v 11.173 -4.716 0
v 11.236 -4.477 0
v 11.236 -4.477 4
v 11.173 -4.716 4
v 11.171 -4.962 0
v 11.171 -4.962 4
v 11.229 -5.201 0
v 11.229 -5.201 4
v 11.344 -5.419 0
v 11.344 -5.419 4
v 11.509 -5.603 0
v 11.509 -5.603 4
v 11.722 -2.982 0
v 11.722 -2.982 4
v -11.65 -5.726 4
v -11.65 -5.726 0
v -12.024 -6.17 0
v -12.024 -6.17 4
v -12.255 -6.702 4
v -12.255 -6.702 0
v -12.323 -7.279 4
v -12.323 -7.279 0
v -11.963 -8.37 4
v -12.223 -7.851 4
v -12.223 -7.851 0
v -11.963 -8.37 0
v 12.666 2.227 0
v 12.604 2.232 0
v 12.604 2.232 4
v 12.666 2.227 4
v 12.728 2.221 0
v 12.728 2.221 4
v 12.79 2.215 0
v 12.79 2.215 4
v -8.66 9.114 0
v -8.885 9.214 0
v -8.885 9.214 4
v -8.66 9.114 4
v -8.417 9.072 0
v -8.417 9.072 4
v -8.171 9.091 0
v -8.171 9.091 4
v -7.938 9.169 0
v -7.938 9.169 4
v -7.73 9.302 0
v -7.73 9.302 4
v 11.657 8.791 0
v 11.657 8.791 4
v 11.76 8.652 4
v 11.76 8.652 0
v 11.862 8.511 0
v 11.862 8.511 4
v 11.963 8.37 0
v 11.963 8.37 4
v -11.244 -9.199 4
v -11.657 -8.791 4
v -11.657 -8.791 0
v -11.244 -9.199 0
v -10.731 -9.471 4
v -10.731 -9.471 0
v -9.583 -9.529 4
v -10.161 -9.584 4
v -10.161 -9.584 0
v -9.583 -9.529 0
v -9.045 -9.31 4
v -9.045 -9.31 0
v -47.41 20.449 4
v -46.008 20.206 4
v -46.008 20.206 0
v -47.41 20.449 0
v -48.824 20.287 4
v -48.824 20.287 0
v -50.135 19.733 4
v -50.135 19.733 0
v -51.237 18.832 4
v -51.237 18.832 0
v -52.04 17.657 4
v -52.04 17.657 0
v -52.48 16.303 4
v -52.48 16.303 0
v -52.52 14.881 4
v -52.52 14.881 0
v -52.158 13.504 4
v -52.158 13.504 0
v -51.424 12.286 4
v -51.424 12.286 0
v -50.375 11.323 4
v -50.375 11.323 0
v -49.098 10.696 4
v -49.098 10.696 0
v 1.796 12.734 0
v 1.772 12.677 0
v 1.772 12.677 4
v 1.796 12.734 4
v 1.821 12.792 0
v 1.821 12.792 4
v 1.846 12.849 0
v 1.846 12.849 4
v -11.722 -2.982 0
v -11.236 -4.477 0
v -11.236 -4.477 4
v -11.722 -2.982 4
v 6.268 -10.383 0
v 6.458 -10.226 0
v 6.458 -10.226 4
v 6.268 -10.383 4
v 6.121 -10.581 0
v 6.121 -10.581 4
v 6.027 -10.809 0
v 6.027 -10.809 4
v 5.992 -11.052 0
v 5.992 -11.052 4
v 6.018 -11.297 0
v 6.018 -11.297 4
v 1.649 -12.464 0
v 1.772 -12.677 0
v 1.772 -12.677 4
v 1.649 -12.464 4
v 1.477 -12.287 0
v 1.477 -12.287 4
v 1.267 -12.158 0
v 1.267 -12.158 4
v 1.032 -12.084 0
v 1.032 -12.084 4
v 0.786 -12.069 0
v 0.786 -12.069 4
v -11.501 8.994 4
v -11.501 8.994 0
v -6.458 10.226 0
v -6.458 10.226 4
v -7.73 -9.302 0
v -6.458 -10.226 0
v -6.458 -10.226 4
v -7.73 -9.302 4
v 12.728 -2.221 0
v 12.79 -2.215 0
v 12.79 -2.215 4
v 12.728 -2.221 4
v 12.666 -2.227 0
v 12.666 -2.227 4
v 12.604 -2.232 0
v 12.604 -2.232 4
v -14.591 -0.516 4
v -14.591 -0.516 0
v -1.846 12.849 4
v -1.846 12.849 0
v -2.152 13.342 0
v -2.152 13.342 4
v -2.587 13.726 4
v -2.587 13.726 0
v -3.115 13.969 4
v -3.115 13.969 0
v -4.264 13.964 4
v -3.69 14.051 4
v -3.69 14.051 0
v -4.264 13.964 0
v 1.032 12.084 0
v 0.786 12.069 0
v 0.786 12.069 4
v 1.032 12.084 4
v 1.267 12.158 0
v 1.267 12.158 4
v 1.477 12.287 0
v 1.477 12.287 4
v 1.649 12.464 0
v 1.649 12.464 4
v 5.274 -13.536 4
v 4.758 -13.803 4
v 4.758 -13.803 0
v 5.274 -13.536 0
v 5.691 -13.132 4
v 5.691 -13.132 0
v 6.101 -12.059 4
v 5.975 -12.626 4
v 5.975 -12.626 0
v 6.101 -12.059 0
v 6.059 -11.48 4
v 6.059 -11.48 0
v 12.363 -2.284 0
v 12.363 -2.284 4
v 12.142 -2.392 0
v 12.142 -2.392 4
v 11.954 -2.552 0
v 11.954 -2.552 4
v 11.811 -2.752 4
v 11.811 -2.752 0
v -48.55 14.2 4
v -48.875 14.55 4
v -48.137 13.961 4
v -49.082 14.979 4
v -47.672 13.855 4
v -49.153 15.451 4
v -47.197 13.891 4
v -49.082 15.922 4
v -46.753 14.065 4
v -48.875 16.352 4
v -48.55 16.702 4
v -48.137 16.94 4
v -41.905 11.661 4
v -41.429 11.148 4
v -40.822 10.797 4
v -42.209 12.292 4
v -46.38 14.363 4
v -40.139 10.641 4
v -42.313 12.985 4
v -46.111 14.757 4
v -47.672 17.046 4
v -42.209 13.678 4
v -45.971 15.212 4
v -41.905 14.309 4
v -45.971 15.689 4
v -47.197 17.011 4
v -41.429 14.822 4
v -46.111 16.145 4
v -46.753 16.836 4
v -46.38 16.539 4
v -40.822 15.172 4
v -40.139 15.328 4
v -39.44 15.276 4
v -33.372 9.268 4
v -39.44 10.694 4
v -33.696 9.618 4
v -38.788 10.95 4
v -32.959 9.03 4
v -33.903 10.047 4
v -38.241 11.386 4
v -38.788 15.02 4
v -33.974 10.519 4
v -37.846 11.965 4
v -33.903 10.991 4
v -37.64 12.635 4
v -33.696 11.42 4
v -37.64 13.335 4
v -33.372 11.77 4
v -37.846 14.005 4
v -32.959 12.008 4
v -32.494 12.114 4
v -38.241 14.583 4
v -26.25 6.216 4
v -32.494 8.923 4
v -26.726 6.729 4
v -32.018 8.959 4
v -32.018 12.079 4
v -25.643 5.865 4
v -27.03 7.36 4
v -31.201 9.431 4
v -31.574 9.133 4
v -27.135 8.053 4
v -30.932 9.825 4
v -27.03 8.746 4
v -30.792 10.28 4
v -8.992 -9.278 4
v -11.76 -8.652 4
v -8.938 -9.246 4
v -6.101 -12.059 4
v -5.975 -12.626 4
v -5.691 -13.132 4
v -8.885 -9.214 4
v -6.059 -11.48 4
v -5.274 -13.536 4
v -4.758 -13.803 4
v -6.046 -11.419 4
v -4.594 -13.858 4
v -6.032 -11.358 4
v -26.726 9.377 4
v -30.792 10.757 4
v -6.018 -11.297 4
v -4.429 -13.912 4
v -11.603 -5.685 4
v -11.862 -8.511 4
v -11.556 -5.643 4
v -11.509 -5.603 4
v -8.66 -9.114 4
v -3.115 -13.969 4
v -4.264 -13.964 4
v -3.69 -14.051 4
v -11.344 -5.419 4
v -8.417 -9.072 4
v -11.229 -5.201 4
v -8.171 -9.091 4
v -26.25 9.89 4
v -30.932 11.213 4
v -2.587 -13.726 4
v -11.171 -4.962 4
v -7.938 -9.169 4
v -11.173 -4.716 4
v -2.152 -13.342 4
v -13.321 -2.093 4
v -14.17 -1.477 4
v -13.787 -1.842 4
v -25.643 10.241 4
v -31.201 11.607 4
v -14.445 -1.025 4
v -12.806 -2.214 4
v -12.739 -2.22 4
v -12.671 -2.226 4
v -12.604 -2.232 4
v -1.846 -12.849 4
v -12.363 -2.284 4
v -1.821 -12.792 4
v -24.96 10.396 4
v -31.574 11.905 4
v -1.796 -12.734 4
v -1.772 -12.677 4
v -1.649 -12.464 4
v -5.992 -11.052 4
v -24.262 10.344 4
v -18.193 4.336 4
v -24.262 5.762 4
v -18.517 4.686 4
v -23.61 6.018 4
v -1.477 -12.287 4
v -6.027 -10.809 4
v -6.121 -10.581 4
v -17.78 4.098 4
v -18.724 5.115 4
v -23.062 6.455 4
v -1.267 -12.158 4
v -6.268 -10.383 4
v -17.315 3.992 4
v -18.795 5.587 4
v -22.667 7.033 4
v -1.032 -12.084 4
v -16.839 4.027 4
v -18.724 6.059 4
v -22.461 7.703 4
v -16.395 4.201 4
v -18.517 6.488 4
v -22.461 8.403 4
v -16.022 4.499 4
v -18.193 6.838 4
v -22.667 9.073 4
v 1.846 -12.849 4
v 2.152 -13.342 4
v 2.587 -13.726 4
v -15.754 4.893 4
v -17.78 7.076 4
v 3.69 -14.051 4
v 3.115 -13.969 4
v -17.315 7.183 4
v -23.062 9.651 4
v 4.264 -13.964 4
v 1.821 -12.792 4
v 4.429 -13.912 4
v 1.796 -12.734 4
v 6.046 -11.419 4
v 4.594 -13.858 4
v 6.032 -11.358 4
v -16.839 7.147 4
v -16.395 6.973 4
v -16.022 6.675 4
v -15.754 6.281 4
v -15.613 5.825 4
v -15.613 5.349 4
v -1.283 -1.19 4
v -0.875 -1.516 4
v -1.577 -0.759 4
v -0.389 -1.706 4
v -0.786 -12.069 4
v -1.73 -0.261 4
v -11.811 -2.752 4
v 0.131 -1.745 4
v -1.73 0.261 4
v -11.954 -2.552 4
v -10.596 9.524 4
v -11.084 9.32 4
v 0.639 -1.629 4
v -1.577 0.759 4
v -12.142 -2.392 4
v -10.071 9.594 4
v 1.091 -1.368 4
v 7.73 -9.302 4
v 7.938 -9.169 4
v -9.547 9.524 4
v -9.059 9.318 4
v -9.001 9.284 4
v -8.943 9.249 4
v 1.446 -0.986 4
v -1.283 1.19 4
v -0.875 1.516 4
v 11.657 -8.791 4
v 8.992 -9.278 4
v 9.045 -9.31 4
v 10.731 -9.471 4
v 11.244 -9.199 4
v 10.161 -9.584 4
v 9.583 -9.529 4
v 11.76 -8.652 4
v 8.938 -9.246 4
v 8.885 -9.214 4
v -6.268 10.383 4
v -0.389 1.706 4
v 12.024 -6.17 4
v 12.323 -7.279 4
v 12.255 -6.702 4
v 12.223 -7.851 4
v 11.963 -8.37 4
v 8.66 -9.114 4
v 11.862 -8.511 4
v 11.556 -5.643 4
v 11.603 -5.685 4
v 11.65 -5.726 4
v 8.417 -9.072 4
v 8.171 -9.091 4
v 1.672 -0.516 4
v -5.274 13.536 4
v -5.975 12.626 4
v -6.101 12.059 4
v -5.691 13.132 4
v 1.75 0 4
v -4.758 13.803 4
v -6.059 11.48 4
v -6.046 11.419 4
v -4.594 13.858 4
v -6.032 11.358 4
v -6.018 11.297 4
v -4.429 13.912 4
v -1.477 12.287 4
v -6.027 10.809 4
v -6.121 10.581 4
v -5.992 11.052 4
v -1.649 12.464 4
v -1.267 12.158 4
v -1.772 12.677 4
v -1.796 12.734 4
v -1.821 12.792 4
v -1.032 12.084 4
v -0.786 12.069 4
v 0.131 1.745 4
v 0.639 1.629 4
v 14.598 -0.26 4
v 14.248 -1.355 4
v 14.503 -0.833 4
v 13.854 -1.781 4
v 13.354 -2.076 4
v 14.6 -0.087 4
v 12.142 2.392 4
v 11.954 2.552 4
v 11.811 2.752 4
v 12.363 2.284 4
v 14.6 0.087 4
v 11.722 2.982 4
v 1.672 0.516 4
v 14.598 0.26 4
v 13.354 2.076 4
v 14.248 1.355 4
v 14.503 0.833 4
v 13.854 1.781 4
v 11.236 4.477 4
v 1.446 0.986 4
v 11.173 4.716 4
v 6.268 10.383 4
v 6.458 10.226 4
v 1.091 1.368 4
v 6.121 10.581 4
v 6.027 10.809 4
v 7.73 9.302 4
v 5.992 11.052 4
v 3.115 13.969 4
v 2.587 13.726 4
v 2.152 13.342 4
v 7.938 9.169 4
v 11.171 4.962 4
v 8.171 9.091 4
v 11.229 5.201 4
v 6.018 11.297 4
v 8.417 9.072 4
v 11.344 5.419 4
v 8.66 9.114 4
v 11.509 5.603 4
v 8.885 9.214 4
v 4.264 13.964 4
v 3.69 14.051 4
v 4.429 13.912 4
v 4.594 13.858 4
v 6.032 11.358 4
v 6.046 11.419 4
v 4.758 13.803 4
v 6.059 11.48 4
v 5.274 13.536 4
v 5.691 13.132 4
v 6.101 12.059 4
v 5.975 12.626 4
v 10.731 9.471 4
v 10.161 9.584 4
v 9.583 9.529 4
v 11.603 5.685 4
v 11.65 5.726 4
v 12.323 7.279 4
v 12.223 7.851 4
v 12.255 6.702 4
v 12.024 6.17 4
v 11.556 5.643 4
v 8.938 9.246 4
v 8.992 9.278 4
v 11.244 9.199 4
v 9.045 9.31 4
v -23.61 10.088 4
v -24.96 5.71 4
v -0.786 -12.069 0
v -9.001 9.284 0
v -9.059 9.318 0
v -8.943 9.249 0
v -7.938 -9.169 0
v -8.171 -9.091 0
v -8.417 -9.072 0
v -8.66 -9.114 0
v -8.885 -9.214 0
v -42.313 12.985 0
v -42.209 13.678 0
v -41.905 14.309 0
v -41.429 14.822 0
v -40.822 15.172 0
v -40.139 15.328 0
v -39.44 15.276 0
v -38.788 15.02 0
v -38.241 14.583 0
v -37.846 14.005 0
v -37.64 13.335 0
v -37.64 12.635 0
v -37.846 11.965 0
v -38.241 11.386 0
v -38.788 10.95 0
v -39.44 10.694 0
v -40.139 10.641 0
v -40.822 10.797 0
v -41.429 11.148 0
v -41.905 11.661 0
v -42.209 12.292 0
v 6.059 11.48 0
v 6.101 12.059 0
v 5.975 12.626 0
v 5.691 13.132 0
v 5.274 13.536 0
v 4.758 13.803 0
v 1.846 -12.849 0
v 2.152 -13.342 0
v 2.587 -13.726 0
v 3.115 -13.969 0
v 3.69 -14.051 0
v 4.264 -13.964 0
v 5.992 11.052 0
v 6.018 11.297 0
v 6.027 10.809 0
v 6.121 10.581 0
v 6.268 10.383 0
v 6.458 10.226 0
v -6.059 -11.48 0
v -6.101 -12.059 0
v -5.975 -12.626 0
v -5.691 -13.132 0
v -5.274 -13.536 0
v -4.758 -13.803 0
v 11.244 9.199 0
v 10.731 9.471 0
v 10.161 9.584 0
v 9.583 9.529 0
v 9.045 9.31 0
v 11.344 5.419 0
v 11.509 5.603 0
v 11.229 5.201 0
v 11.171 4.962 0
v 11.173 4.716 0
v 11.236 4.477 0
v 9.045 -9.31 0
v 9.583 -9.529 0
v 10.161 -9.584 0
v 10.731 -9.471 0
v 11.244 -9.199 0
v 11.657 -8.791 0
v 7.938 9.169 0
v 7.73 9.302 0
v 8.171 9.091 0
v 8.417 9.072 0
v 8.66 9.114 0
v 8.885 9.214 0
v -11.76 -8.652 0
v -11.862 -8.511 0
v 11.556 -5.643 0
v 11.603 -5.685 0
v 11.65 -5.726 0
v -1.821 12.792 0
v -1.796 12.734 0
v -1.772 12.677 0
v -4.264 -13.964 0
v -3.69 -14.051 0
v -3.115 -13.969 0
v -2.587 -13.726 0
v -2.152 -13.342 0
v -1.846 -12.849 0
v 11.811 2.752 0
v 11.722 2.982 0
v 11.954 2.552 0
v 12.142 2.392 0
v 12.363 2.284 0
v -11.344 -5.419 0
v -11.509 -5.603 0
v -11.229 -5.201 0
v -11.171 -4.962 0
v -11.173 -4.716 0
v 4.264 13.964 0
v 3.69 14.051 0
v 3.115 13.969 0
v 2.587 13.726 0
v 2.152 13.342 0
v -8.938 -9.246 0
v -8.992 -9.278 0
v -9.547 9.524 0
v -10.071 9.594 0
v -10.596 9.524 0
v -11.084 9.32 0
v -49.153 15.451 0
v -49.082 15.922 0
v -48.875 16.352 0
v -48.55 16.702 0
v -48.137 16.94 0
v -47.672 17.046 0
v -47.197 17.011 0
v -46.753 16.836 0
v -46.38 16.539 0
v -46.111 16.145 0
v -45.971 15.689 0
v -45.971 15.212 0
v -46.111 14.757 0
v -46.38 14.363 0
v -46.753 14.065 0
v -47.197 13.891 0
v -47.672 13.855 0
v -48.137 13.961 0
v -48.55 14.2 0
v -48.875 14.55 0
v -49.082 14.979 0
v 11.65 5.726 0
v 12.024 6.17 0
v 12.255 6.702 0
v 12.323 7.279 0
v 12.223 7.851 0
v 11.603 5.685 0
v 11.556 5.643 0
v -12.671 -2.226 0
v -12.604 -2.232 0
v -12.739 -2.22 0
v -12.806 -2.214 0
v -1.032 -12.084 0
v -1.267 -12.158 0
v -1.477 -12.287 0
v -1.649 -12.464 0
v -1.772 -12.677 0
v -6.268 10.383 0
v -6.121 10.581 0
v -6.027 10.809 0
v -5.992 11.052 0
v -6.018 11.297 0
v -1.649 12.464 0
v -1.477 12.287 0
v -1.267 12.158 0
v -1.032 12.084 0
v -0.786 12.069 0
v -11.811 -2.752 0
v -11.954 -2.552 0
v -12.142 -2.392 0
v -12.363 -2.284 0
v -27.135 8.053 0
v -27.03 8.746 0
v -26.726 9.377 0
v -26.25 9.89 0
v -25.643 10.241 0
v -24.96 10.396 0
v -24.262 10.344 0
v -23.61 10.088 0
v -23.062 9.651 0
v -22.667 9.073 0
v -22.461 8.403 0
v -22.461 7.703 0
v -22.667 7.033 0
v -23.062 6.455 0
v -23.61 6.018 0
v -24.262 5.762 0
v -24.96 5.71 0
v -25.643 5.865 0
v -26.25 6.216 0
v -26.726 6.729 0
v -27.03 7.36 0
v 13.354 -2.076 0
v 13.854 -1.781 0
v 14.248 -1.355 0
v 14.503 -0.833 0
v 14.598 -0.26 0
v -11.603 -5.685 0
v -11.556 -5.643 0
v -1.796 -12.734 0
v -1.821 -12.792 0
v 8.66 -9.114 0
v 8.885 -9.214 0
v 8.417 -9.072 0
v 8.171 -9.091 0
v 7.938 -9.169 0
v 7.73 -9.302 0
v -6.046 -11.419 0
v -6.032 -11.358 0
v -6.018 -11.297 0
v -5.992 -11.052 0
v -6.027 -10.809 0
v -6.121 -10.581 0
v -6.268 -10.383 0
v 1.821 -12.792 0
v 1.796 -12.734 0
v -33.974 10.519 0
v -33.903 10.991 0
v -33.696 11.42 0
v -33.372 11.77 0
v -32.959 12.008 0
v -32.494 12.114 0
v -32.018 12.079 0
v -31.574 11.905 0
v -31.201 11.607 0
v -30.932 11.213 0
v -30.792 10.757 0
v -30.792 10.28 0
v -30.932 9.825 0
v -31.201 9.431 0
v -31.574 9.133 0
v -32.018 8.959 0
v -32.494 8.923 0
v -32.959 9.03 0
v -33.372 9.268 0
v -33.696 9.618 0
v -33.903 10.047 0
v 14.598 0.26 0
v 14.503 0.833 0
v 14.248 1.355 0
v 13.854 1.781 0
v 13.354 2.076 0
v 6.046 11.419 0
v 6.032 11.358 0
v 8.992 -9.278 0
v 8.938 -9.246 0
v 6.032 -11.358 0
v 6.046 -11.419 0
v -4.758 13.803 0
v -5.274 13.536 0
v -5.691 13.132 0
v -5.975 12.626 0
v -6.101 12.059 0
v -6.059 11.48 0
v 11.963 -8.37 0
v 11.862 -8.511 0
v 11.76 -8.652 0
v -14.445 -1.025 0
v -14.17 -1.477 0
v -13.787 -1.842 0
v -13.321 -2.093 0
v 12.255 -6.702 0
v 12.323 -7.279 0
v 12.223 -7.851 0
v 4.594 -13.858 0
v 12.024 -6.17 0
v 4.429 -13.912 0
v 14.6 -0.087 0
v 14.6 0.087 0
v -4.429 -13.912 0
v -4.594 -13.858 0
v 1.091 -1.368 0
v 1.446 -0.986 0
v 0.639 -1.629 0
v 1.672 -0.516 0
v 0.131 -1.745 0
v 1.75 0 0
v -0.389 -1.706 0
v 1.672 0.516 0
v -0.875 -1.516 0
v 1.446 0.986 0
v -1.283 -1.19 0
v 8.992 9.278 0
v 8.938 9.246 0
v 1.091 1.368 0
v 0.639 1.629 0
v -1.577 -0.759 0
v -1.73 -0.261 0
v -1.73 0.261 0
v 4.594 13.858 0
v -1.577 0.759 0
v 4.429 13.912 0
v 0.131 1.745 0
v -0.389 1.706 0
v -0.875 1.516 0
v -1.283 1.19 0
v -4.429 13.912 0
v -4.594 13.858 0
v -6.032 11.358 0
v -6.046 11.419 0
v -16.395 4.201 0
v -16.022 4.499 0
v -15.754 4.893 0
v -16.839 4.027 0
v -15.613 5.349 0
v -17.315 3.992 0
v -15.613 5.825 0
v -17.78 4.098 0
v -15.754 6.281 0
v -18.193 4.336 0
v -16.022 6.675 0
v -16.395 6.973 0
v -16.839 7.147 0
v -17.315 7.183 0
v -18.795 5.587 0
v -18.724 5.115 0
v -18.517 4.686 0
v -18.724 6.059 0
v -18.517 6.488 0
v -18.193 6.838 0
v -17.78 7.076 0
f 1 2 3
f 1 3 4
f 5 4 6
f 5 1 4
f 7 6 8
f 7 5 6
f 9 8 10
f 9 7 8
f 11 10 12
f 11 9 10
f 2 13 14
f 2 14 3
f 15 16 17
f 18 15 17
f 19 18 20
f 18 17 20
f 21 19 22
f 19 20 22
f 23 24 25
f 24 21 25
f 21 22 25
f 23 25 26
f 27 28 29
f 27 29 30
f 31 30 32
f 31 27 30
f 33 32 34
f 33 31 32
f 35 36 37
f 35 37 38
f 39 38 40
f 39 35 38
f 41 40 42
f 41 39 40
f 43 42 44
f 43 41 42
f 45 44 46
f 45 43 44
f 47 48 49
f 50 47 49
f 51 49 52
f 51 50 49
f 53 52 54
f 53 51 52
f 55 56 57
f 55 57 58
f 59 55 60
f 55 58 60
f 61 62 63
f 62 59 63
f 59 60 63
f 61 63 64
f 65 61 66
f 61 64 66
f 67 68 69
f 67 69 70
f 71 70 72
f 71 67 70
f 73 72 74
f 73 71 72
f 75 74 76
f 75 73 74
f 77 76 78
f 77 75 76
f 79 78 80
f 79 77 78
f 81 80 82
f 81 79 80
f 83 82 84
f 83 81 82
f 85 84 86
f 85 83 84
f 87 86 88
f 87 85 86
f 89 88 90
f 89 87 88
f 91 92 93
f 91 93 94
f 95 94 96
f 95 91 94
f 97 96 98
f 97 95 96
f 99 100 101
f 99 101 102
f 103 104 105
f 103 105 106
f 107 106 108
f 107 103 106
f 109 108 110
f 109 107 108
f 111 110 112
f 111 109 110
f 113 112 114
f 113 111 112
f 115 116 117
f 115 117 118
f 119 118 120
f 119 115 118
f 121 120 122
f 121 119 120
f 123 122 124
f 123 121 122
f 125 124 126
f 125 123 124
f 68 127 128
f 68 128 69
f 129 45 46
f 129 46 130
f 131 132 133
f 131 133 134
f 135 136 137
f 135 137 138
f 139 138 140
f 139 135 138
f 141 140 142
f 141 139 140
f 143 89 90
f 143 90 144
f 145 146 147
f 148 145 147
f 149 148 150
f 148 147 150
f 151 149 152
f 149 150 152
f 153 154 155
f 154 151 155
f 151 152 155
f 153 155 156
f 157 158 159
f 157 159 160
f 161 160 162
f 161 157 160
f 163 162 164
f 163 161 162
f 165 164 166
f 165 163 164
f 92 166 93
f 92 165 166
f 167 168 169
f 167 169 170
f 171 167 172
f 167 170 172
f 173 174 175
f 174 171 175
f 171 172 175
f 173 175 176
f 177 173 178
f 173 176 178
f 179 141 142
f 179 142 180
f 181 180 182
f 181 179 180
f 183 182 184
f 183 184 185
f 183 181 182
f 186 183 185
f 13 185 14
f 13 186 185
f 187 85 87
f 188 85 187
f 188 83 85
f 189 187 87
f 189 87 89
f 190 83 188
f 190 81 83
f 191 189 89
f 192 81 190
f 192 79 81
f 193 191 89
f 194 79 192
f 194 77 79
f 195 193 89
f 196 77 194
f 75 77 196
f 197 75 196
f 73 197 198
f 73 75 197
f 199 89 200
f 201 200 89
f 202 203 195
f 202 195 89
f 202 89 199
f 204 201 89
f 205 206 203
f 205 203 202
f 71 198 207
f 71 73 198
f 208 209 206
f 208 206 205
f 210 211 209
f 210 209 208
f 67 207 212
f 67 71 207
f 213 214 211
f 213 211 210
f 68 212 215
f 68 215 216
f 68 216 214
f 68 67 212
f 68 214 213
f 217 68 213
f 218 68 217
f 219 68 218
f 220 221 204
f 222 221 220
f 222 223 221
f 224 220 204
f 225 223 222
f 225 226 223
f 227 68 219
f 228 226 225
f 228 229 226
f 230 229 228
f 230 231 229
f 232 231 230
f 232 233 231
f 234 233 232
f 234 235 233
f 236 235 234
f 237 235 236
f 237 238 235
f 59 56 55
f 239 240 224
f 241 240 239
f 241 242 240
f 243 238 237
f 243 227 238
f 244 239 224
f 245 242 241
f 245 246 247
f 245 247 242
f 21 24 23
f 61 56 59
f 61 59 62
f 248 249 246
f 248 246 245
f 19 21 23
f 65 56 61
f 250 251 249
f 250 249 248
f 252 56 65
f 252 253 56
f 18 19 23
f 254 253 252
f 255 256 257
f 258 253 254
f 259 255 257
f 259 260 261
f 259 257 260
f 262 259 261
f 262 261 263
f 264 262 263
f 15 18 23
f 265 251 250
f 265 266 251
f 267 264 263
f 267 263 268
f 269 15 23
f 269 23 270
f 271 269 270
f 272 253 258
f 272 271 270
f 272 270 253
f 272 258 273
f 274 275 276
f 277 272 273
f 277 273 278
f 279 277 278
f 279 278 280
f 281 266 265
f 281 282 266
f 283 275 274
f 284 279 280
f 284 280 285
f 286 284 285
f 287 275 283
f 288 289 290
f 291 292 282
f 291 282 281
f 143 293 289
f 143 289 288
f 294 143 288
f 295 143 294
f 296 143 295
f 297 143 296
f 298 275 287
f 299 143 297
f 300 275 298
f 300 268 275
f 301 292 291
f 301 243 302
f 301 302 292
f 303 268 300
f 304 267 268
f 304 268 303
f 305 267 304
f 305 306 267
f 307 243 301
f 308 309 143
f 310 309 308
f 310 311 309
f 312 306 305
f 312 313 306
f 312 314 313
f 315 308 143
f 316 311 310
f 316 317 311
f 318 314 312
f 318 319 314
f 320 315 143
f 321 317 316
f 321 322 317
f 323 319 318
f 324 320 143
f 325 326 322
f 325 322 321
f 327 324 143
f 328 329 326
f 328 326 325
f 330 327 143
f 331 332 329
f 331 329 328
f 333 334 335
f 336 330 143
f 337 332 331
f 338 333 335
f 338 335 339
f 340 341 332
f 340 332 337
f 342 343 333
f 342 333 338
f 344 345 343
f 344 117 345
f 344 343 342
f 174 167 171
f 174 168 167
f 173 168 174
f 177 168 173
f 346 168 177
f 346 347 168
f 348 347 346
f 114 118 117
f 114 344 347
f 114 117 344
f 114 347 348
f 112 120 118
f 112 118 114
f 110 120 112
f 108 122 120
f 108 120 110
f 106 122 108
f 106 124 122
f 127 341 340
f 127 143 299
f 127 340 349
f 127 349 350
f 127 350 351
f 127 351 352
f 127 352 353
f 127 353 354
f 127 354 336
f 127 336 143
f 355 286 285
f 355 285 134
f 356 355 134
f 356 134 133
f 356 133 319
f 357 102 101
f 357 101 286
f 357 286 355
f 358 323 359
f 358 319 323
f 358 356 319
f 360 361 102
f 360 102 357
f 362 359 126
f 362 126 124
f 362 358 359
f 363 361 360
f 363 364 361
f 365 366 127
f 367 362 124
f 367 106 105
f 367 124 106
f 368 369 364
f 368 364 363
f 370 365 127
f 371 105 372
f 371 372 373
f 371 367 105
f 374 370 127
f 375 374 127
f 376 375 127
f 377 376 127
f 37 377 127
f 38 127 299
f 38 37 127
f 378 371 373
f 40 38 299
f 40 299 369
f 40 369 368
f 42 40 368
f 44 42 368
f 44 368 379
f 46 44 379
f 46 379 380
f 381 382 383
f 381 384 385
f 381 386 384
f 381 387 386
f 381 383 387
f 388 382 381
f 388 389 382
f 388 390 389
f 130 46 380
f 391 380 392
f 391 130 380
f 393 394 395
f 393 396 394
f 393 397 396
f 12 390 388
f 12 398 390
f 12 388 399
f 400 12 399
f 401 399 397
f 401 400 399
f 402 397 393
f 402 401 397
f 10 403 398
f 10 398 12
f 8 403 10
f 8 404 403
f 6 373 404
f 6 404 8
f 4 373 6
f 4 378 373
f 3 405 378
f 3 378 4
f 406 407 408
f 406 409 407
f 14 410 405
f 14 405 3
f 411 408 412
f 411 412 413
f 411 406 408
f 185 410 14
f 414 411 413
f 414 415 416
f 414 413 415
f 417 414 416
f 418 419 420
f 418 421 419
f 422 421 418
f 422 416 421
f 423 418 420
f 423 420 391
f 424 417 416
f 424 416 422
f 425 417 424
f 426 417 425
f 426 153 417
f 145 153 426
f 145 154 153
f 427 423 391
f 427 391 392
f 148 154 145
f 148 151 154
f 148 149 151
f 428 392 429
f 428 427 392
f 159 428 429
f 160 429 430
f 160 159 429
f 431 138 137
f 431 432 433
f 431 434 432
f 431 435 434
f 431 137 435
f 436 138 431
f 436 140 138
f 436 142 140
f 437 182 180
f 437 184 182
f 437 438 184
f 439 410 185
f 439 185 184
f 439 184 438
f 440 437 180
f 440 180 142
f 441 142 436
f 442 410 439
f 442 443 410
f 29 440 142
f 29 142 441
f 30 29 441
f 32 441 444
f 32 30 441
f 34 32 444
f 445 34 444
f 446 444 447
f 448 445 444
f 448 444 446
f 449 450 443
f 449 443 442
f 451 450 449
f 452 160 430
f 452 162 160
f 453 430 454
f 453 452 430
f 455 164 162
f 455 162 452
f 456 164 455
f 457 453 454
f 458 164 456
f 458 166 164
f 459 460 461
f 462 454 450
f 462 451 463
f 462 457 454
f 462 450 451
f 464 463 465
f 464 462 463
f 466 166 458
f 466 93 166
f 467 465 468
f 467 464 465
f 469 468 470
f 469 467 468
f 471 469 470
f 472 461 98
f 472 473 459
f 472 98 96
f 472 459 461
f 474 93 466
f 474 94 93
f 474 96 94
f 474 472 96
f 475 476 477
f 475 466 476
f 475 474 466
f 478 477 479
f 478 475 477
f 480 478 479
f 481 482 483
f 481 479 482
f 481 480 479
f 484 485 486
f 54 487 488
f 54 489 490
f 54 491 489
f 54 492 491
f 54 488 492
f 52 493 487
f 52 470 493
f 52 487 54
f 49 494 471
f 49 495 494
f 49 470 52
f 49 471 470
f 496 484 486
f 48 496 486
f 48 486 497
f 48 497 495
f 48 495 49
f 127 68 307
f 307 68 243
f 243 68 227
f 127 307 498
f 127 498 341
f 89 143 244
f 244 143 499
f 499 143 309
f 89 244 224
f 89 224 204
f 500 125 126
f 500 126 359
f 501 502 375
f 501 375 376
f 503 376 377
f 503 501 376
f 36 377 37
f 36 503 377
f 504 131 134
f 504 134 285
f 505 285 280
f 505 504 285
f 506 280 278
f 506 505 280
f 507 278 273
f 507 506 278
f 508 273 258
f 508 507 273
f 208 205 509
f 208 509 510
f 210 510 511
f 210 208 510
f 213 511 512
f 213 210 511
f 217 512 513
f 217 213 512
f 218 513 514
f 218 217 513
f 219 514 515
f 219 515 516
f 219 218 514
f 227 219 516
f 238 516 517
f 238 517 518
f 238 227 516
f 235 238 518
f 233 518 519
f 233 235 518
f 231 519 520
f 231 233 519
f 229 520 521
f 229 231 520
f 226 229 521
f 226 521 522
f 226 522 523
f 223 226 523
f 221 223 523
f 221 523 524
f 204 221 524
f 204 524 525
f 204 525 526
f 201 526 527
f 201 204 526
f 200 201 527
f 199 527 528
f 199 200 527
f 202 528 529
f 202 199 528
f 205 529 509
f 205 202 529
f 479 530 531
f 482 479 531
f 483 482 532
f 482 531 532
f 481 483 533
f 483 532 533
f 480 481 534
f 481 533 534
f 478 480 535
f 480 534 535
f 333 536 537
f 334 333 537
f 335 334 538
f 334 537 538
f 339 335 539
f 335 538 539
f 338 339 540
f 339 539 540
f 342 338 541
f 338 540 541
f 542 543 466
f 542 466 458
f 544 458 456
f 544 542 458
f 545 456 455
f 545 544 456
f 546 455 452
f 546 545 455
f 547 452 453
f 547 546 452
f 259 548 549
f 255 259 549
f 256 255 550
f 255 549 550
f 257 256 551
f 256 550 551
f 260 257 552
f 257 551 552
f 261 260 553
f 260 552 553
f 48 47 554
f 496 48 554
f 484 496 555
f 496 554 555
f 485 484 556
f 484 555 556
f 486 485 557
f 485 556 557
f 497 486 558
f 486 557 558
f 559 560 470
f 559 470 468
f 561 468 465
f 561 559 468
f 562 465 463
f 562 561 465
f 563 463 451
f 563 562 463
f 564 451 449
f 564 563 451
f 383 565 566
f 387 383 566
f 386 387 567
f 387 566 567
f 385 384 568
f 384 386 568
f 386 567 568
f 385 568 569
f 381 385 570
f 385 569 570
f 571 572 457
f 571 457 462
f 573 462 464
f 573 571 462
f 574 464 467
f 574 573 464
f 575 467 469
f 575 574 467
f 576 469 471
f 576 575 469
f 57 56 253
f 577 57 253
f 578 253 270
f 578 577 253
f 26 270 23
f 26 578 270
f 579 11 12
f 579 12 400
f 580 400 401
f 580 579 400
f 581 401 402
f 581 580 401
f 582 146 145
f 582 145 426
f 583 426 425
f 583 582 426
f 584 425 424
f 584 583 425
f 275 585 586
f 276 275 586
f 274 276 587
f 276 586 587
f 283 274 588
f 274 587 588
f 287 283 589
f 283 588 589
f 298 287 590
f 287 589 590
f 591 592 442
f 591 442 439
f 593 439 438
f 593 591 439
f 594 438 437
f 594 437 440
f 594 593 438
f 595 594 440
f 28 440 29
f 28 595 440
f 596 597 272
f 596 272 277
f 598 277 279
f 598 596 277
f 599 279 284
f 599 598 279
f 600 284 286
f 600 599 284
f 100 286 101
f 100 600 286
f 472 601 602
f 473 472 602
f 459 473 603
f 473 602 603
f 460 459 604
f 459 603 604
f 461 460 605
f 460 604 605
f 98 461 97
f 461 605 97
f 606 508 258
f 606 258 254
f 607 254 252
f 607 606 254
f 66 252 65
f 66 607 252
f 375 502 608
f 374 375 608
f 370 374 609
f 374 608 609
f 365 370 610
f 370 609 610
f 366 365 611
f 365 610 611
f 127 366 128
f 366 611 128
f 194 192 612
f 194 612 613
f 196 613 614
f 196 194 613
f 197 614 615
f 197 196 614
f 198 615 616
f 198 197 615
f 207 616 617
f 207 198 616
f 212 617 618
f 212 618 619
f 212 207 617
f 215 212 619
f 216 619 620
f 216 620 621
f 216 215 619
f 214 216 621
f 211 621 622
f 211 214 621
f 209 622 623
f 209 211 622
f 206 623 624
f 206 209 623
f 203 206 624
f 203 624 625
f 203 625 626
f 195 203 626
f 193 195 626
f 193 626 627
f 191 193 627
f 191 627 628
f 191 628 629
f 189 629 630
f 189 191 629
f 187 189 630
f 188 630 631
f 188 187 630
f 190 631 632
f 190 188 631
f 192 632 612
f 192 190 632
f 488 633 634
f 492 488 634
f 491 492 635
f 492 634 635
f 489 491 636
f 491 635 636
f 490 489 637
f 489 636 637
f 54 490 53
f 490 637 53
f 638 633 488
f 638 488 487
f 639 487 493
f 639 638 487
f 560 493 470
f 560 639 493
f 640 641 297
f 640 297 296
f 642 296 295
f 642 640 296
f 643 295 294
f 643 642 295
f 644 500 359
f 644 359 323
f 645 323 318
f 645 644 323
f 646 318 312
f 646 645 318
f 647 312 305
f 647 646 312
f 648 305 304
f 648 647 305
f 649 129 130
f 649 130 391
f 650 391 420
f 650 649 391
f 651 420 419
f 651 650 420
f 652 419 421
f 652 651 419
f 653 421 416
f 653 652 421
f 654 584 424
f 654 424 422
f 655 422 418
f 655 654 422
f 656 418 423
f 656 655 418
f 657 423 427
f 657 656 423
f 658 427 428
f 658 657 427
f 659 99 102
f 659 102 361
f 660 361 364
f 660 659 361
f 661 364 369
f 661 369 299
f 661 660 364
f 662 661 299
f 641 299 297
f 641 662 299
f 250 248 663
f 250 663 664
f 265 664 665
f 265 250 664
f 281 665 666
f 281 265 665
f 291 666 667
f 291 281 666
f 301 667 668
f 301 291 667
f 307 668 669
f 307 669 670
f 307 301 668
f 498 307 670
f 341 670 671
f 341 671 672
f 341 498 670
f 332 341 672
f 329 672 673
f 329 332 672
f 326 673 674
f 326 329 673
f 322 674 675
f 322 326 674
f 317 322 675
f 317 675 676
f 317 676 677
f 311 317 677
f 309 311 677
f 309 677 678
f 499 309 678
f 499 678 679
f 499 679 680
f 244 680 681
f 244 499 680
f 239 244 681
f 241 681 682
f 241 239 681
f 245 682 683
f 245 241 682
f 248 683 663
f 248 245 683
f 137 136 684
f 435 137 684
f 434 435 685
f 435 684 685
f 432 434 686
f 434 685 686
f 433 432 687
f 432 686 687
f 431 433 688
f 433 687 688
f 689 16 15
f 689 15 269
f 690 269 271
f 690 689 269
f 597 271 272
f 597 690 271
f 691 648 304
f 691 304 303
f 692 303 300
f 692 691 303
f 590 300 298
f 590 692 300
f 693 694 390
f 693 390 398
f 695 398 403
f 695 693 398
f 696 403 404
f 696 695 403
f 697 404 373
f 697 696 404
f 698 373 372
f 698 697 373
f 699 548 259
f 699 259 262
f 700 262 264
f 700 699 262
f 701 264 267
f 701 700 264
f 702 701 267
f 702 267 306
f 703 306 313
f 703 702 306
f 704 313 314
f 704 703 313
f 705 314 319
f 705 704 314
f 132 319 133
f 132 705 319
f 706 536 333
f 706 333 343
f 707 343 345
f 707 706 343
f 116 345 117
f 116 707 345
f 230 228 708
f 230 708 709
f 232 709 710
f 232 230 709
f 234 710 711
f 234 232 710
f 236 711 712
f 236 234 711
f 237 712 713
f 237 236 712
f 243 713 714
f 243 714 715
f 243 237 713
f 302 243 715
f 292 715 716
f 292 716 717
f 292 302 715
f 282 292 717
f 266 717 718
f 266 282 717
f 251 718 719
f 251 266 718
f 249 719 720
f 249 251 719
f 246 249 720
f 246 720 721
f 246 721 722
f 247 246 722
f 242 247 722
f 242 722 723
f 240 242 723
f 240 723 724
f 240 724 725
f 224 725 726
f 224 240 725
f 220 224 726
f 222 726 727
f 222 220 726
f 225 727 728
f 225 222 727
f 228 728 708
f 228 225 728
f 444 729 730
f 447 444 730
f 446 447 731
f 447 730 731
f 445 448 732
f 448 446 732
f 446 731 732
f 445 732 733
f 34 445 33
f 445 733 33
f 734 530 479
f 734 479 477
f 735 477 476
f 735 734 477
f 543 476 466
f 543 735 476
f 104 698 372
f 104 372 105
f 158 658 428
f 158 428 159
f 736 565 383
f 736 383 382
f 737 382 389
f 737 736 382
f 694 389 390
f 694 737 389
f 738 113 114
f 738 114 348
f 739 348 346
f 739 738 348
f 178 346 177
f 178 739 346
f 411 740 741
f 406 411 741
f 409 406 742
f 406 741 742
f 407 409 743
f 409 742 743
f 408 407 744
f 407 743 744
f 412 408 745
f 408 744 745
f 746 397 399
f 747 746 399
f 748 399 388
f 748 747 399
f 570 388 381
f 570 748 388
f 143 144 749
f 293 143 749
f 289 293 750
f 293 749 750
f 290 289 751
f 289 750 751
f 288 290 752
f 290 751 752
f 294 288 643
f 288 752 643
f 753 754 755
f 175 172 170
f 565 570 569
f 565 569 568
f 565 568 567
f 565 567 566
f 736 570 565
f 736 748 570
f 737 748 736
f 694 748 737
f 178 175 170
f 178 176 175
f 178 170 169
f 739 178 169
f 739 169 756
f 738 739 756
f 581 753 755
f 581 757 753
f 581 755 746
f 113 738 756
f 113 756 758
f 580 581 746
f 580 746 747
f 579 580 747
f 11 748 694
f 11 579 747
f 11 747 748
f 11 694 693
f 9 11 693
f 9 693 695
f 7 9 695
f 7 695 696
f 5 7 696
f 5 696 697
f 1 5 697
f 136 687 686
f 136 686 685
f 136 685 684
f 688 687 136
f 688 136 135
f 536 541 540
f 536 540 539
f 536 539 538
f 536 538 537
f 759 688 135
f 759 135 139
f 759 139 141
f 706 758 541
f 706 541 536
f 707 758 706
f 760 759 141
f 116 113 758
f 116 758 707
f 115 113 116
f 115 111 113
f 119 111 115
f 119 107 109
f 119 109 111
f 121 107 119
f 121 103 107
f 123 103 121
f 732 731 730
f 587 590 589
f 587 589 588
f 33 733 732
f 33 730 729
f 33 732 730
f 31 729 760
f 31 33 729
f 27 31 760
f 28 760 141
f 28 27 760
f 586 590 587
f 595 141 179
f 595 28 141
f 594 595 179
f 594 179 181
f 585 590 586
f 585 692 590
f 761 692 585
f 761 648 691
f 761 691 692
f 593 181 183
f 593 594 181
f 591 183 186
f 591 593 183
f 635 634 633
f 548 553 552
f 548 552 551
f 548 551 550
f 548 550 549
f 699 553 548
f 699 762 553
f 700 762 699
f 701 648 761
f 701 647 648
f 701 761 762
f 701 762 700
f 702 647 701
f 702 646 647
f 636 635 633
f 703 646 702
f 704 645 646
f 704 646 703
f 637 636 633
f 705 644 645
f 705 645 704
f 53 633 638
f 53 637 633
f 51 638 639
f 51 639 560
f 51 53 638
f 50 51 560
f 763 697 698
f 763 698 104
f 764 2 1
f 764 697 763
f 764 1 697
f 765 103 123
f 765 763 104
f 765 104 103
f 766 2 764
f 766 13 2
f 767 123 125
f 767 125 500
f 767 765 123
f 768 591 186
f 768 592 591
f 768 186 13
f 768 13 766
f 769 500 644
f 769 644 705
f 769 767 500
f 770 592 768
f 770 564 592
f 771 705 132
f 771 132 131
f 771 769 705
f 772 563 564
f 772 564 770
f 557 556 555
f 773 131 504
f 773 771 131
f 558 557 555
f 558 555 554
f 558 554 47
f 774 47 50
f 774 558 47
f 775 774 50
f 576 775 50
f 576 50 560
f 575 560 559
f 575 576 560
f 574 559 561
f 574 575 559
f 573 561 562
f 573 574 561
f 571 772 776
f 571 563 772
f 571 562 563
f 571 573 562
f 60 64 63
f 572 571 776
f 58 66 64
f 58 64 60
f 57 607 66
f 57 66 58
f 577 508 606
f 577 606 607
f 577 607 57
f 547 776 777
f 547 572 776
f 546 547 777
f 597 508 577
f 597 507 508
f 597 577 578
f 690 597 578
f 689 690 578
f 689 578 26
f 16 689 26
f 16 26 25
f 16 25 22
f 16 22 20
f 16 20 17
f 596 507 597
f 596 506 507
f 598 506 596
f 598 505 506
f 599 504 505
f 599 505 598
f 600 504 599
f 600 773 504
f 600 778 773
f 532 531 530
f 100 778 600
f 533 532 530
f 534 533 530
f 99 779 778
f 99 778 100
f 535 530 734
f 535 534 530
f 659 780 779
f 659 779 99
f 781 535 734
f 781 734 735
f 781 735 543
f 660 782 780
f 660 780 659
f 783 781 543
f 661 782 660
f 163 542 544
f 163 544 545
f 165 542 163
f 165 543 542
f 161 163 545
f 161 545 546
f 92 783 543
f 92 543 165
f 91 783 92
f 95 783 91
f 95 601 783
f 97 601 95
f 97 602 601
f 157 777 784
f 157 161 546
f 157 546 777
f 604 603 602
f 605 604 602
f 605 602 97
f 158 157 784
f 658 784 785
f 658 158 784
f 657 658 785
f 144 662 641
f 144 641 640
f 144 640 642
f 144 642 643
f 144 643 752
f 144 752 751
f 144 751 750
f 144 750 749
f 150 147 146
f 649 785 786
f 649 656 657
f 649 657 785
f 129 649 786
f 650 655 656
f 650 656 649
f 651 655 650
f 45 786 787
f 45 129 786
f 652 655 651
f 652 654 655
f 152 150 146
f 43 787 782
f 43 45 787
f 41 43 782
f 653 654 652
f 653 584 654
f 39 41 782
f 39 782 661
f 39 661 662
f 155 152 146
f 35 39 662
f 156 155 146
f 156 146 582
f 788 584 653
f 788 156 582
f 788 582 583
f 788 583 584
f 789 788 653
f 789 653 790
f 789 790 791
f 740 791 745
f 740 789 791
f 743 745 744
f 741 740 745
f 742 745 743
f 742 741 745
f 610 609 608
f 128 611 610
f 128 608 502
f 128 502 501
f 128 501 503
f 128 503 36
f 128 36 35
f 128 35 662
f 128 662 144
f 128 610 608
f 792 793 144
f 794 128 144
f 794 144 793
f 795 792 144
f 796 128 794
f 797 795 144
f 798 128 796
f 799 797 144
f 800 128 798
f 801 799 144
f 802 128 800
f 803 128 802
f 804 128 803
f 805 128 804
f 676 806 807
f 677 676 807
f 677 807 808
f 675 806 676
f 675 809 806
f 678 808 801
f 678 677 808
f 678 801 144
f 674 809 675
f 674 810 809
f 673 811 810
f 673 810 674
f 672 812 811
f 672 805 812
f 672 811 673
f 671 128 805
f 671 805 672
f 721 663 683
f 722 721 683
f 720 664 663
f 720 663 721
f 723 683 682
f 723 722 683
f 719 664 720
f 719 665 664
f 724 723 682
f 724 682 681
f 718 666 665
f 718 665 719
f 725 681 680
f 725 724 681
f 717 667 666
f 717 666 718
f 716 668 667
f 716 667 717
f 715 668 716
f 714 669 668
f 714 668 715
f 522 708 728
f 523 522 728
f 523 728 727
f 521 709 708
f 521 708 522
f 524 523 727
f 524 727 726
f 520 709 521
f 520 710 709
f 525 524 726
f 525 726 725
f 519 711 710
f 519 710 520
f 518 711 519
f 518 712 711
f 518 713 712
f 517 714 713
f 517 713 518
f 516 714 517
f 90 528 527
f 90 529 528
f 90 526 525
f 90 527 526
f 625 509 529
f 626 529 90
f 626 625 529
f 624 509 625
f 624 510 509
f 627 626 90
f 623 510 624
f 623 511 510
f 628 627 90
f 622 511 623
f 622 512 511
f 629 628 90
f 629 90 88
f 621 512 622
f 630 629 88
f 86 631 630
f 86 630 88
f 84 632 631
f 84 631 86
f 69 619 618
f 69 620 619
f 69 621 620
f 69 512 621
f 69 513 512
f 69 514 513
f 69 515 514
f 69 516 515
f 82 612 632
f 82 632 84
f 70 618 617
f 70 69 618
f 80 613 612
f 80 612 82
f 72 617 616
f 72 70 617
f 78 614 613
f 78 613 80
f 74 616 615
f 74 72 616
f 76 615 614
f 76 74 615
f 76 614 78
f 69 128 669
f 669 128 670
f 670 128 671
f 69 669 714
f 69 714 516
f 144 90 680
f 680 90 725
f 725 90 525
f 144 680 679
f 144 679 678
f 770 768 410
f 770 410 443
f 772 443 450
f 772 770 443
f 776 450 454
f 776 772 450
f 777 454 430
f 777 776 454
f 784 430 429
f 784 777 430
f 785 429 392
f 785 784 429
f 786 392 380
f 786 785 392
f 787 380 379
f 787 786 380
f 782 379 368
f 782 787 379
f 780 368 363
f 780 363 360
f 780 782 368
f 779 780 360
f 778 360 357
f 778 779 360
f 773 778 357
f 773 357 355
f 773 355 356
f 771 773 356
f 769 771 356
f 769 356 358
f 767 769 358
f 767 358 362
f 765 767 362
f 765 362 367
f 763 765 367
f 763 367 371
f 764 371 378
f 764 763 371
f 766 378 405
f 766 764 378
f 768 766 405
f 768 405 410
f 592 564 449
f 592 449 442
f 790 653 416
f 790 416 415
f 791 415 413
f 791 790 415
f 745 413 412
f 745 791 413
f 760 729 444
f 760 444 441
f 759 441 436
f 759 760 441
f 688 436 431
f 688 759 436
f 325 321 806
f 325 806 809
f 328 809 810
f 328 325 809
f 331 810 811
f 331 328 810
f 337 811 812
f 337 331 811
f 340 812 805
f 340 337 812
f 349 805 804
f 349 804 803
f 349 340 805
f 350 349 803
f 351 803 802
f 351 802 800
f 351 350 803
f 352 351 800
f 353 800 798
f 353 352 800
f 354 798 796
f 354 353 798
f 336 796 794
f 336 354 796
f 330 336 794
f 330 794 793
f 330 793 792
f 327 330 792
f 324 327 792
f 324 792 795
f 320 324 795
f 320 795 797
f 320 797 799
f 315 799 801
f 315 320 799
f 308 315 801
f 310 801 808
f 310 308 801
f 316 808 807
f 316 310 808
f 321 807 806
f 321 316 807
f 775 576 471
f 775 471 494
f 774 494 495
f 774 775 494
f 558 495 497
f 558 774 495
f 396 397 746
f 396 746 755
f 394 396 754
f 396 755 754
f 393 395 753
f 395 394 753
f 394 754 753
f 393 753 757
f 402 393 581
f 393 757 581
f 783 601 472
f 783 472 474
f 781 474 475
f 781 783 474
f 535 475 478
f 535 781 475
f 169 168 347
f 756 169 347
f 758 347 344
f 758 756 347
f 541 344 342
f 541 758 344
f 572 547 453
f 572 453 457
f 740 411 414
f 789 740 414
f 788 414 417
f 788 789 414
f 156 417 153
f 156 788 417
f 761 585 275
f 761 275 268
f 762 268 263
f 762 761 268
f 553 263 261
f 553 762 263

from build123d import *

# Parameters (mm, degrees)
SKETCH1_R           = 1.75
BOSS_EXTRUDE1_DEPTH = 4
BOSS_EXTRUDE2_START = -4
SKETCH2_R           = 1.6
SKETCH2_R_2         = 2.35
BOSS_EXTRUDE2_DEPTH = 4
FILLET1_R           = 2


with BuildPart() as part:
    # Sketch1 → Boss-Extrude1 (new body)
    with BuildSketch(Plane.XY):
        with BuildLine():
            Line((6.458174517, 10.22648556), (7.730280052, 9.302246788))
            ThreePointArc((7.730280052, 9.302246788), (8.293531937, 9.074228241), (8.884801529, 9.214390334))
            ThreePointArc((8.884801529, 9.214390334), (9.700788202, 9.679292345), (10.537793023, 10.105192636))
            ThreePointArc((10.537793023, 10.105192636), (11.811648118, 8.581664683), (12.866966432, 6.899360466))
            ThreePointArc((12.866966432, 6.899360466), (12.203262471, 6.234932004), (11.508960635, 5.602545185))
            ThreePointArc((11.508960635, 5.602545185), (11.192946211, 5.083526854), (11.235750332, 4.477380873))
            Line((11.235750332, 4.477380873), (11.721651409, 2.981931127))
            ThreePointArc((11.721651409, 2.981931127), (12.043305816, 2.466389096), (12.604038176, 2.232243064))
            ThreePointArc((12.604038176, 2.232243064), (13.537447807, 2.12873176), (14.464936842, 1.981313243))
            ThreePointArc((14.464936842, 1.981313243), (14.6, 0), (14.464936842, -1.981313243))
            ThreePointArc((14.464936842, -1.981313243), (13.537447807, -2.12873176), (12.604038176, -2.232243064))
            ThreePointArc((12.604038176, -2.232243064), (12.043305816, -2.466389096), (11.721651409, -2.981931127))
            Line((11.721651409, -2.981931127), (11.235750332, -4.477380873))
            ThreePointArc((11.235750332, -4.477380873), (11.192946211, -5.083526854), (11.508960635, -5.602545185))
            ThreePointArc((11.508960635, -5.602545185), (12.203262471, -6.234932004), (12.866966432, -6.899360466))
            ThreePointArc((12.866966432, -6.899360466), (11.811648118, -8.581664683), (10.537793023, -10.105192636))
            ThreePointArc((10.537793023, -10.105192636), (9.700788202, -9.679292345), (8.884801529, -9.214390334))
            ThreePointArc((8.884801529, -9.214390334), (8.293531937, -9.074228241), (7.730280052, -9.302246788))
            Line((7.730280052, -9.302246788), (6.458174517, -10.22648556))
            ThreePointArc((6.458174517, -10.22648556), (6.067261587, -10.691708329), (6.017851306, -11.297351596))
            ThreePointArc((6.017851306, -11.297351596), (6.207845644, -12.21706366), (6.354252177, -13.144712978))
            ThreePointArc((6.354252177, -13.144712978), (4.511648118, -13.885425138), (2.585570436, -14.369231904))
            ThreePointArc((2.585570436, -14.369231904), (2.158757221, -13.532692241), (1.771872682, -12.676953681))
            ThreePointArc((1.771872682, -12.676953681), (1.375910744, -12.216020619), (0.786204458, -12.069420349))
            Line((0.786204458, -12.069420349), (-0.786204458, -12.069420349))
            ThreePointArc((-0.786204458, -12.069420349), (-1.375910744, -12.216020619), (-1.771872682, -12.676953681))
            ThreePointArc((-1.771872682, -12.676953681), (-2.158757221, -13.532692241), (-2.585570436, -14.369231904))
            ThreePointArc((-2.585570436, -14.369231904), (-4.511648118, -13.885425138), (-6.354252177, -13.144712978))
            ThreePointArc((-6.354252177, -13.144712978), (-6.207845644, -12.21706366), (-6.017851306, -11.297351596))
            ThreePointArc((-6.017851306, -11.297351596), (-6.067261587, -10.691708329), (-6.458174517, -10.22648556))
            Line((-6.458174517, -10.22648556), (-7.730280052, -9.302246788))
            ThreePointArc((-7.730280052, -9.302246788), (-8.293531937, -9.074228241), (-8.884801529, -9.214390334))
            ThreePointArc((-8.884801529, -9.214390334), (-9.700788202, -9.679292345), (-10.537793023, -10.105192636))
            ThreePointArc((-10.537793023, -10.105192636), (-11.811648118, -8.581664683), (-12.866966432, -6.899360466))
            ThreePointArc((-12.866966432, -6.899360466), (-12.203262471, -6.234932004), (-11.508960635, -5.602545185))
            ThreePointArc((-11.508960635, -5.602545185), (-11.192946211, -5.083526854), (-11.235750332, -4.477380873))
            Line((-11.235750332, -4.477380873), (-11.721651409, -2.981931127))
            ThreePointArc((-11.721651409, -2.981931127), (-12.043305816, -2.466389096), (-12.604038176, -2.232243064))
            ThreePointArc((-12.604038176, -2.232243064), (-13.537447807, -2.12873176), (-14.464936842, -1.981313243))
            ThreePointArc((-14.464936842, -1.981313243), (-14.6, 0), (-14.464936842, 1.981313243))
            ThreePointArc((-14.464936842, 1.981313243), (-13.537447807, 2.12873176), (-12.604038176, 2.232243064))
            ThreePointArc((-12.604038176, 2.232243064), (-12.043305816, 2.466389096), (-11.721651409, 2.981931127))
            Line((-11.721651409, 2.981931127), (-11.235750332, 4.477380873))
            ThreePointArc((-11.235750332, 4.477380873), (-11.192946211, 5.083526854), (-11.508960635, 5.602545185))
            ThreePointArc((-11.508960635, 5.602545185), (-12.203262471, 6.234932004), (-12.866966432, 6.899360466))
            ThreePointArc((-12.866966432, 6.899360466), (-11.811648118, 8.581664683), (-10.537793023, 10.105192636))
            ThreePointArc((-10.537793023, 10.105192636), (-9.700788202, 9.679292345), (-8.884801529, 9.214390334))
            ThreePointArc((-8.884801529, 9.214390334), (-8.293531937, 9.074228241), (-7.730280052, 9.302246788))
            Line((-7.730280052, 9.302246788), (-6.458174517, 10.22648556))
            ThreePointArc((-6.458174517, 10.22648556), (-6.067261587, 10.691708329), (-6.017851306, 11.297351596))
            ThreePointArc((-6.017851306, 11.297351596), (-6.207845644, 12.21706366), (-6.354252177, 13.144712978))
            ThreePointArc((-6.354252177, 13.144712978), (-4.511648118, 13.885425138), (-2.585570436, 14.369231904))
            ThreePointArc((-2.585570436, 14.369231904), (-2.158757221, 13.532692241), (-1.771872682, 12.676953681))
            ThreePointArc((-1.771872682, 12.676953681), (-1.375910744, 12.216020619), (-0.786204458, 12.069420349))
            Line((-0.786204458, 12.069420349), (0.786204458, 12.069420349))
            ThreePointArc((0.786204458, 12.069420349), (1.375910744, 12.216020619), (1.771872682, 12.676953681))
            ThreePointArc((1.771872682, 12.676953681), (2.158757221, 13.532692241), (2.585570436, 14.369231904))
            ThreePointArc((2.585570436, 14.369231904), (4.511648118, 13.885425138), (6.354252177, 13.144712978))
            ThreePointArc((6.354252177, 13.144712978), (6.207845644, 12.21706366), (6.017851306, 11.297351596))
            ThreePointArc((6.017851306, 11.297351596), (6.067261587, 10.691708329), (6.458174517, 10.22648556))
        make_face()
        Circle(SKETCH1_R, mode=Mode.SUBTRACT)
    extrude(amount=BOSS_EXTRUDE1_DEPTH)

    # Sketch2 → Boss-Extrude2 (add)
    with BuildSketch(Plane(origin=(0, 0, 0), x_dir=(-1, 0, 0), z_dir=(0, 0, -1)).offset(BOSS_EXTRUDE2_START)):
        with BuildLine():
            Line((7.965480191, 7.845452525), (46.007740843, 20.2061323))
            ThreePointArc((46.007740843, 20.2061323), (52.308108396, 16.995934691), (49.097910787, 10.695567137))
            Line((49.097910787, 10.695567137), (11.055650135, -1.665112638))
            Line((11.055650135, -1.665112638), (7.965480191, 7.845452525))
        make_face()
        with Locations((47.552825815, 15.450849719)):
            Circle(SKETCH2_R, mode=Mode.SUBTRACT)
        with Locations((39.963394815, 12.984894104)):
            Circle(SKETCH2_R_2, mode=Mode.SUBTRACT)
        with Locations((32.373963815, 10.518938489)):
            Circle(SKETCH2_R, mode=Mode.SUBTRACT)
        with Locations((24.784532815, 8.052982873)):
            Circle(SKETCH2_R_2, mode=Mode.SUBTRACT)
        with Locations((17.195101815, 5.587027258)):
            Circle(SKETCH2_R, mode=Mode.SUBTRACT)
    extrude(amount=BOSS_EXTRUDE2_DEPTH)

    # Fillet1
    # the kernel refuses this fillet: 2 mm, written as the material it takes off along each edge
    with BuildSketch(Plane(origin=(-14.464936842, -1.981313243, -4.187001337), x_dir=(-0.08564855994772169, 0.9963254107864967, 0), z_dir=(0, 0, 1))) as fillet1_piece_1:
        with BuildLine():
            CenterArc((1.593192122, -1.99621856), FILLET1_R, 93.523868458, 76.001739978)
            Line((-0.373480398, -1.63262648), (-0.412813848, -1.625354638))
            ThreePointArc((-0.412813848, -1.625354638), (-0.242909966, -0.803463818), (-0.038582997, 0.010552361))
            Line((-0.038582997, 0.010552361), (-0.00201406, 0.039949262))
            ThreePointArc((-0.00201406, 0.039949262), (0.73513172, 0.058519233), (1.467804867, 0.039924371))
            Line((1.467804867, 0.039924371), (1.470263441, 0))
        make_face()
    extrude(amount=12.374002673, mode=Mode.SUBTRACT)
    with BuildSketch(Plane(origin=(-10.537793023, 10.105192636, -4.187001337), x_dir=(0.8827178463652419, -0.4699033982727826, 0), z_dir=(0, 0, 1))) as fillet1_piece_2:
        with BuildLine():
            CenterArc((1.590668977, -1.998229687), FILLET1_R, 87.589097028, 76.001739978)
            Line((-0.327868641, -1.433239945), (-0.366239393, -1.42194015))
            ThreePointArc((-0.366239393, -1.42194015), (-0.220979949, -0.703570188), (-0.038494143, 0.010872025))
            Line((-0.038494143, 0.010872025), (-0.001682631, 0.039964594))
            ThreePointArc((-0.001682631, 0.039964594), (0.837400267, 0.057620746), (1.676483166, 0.039964594))
            Line((1.676483166, 0.039964594), (1.674800535, 0))
        make_face()
    extrude(amount=12.374002673, mode=Mode.SUBTRACT)
    with BuildSketch(Plane(origin=(-6.354252177, 13.144712978, -4.315988382), x_dir=(0.9244796007365503, 0.3812315147282405, 0), z_dir=(0, 0, 1)), Plane(origin=(2.585570436, 14.369231904, -4.315988382), x_dir=(0.9720019700152155, -0.23497270115172955, 0), z_dir=(0, 0, 1)), Plane(origin=(10.537793023, 10.105192636, -4.315988382), x_dir=(0.6482526238799229, -0.7614253316201104, 0), z_dir=(0, 0, 1)), Plane(origin=(14.464936842, 1.981313243, -4.315988382), x_dir=(0.07689280871880408, -0.9970393653047674, 0), z_dir=(0, 0, 1)), Plane(origin=(12.866966432, -6.899360466, -4.315988382), x_dir=(-0.5238374458824551, -0.8518182495646274, 0), z_dir=(0, 0, 1)), Plane(origin=(6.354252177, -13.144712978, -4.315988382), x_dir=(-0.9244796007365504, -0.3812315147282399, 0), z_dir=(0, 0, 1)), Plane(origin=(-2.585570436, -14.369231904, -4.315988382), x_dir=(-0.9720019700152157, 0.23497270115172855, 0), z_dir=(0, 0, 1)), Plane(origin=(-10.537793023, -10.105192636, -4.315988382), x_dir=(-0.6482526238799226, 0.7614253316201107, 0), z_dir=(0, 0, 1))) as fillet1_piece_3:
        with BuildLine():
            CenterArc((1.608149096, -1.996501396), FILLET1_R, 86.610517624, 83.465059025)
            Line((-0.361922802, -1.651803385), (-0.40132424, -1.644909425))
            ThreePointArc((-0.40132424, -1.644909425), (-0.237581401, -0.813495816), (-0.038674208, 0.010213013))
            Line((-0.038674208, 0.010213013), (-0.002364925, 0.039930028))
            ThreePointArc((-0.002364925, 0.039930028), (0.863197676, 0.065539812), (1.728760278, 0.039930028))
            Line((1.728760278, 0.039930028), (1.726395353, 0))
        make_face()
    extrude(amount=12.631976765, mode=Mode.SUBTRACT)
    with BuildSketch(Plane(origin=(-2.585570436, 14.369231904, -4.315988382), x_dir=(0.43756555631998817, -0.8991865123111997, 0), z_dir=(0, 0, 1)), Plane(origin=(6.354252177, 13.144712978, -4.315988382), x_dir=(-0.1745305997808264, -0.9846517504885395, 0), z_dir=(0, 0, 1)), Plane(origin=(12.866966432, 6.899360466, -4.315988382), x_dir=(-0.719961998842273, -0.6940134870613388, 0), z_dir=(0, 0, 1)), Plane(origin=(14.464936842, -1.981313243, -4.315988382), x_dir=(-0.9903923849542835, -0.13828566022753844, 0), z_dir=(0, 0, 1)), Plane(origin=(10.537793023, -10.105192636, -4.315988382), x_dir=(-0.8825265422128264, 0.47026258865645726, 0), z_dir=(0, 0, 1)), Plane(origin=(2.585570436, -14.369231904, -4.315988382), x_dir=(-0.4375655563199897, 0.899186512311199, 0), z_dir=(0, 0, 1)), Plane(origin=(-6.354252177, -13.144712978, -4.315988382), x_dir=(0.17453059978082774, 0.9846517504885393, 0), z_dir=(0, 0, 1)), Plane(origin=(-12.866966432, -6.899360466, -4.315988382), x_dir=(0.7199619988422736, 0.694013487061338, 0), z_dir=(0, 0, 1))) as fillet1_piece_4:
        with BuildLine():
            CenterArc((1.606043881, -1.998195283), FILLET1_R, 87.565780038, 83.465059025)
            Line((-0.369500914, -1.686389632), (-0.40901181, -1.680153518))
            ThreePointArc((-0.40901181, -1.680153518), (-0.248771516, -0.82916731), (-0.038498565, 0.010856359))
            Line((-0.038498565, 0.010856359), (-0.001698895, 0.039963906))
            ThreePointArc((-0.001698895, 0.039963906), (0.845494314, 0.05796318), (1.692687522, 0.039963906))
            Line((1.692687522, 0.039963906), (1.690988628, 0))
        make_face()
    extrude(amount=12.631976765, mode=Mode.SUBTRACT)


solid = part.part
